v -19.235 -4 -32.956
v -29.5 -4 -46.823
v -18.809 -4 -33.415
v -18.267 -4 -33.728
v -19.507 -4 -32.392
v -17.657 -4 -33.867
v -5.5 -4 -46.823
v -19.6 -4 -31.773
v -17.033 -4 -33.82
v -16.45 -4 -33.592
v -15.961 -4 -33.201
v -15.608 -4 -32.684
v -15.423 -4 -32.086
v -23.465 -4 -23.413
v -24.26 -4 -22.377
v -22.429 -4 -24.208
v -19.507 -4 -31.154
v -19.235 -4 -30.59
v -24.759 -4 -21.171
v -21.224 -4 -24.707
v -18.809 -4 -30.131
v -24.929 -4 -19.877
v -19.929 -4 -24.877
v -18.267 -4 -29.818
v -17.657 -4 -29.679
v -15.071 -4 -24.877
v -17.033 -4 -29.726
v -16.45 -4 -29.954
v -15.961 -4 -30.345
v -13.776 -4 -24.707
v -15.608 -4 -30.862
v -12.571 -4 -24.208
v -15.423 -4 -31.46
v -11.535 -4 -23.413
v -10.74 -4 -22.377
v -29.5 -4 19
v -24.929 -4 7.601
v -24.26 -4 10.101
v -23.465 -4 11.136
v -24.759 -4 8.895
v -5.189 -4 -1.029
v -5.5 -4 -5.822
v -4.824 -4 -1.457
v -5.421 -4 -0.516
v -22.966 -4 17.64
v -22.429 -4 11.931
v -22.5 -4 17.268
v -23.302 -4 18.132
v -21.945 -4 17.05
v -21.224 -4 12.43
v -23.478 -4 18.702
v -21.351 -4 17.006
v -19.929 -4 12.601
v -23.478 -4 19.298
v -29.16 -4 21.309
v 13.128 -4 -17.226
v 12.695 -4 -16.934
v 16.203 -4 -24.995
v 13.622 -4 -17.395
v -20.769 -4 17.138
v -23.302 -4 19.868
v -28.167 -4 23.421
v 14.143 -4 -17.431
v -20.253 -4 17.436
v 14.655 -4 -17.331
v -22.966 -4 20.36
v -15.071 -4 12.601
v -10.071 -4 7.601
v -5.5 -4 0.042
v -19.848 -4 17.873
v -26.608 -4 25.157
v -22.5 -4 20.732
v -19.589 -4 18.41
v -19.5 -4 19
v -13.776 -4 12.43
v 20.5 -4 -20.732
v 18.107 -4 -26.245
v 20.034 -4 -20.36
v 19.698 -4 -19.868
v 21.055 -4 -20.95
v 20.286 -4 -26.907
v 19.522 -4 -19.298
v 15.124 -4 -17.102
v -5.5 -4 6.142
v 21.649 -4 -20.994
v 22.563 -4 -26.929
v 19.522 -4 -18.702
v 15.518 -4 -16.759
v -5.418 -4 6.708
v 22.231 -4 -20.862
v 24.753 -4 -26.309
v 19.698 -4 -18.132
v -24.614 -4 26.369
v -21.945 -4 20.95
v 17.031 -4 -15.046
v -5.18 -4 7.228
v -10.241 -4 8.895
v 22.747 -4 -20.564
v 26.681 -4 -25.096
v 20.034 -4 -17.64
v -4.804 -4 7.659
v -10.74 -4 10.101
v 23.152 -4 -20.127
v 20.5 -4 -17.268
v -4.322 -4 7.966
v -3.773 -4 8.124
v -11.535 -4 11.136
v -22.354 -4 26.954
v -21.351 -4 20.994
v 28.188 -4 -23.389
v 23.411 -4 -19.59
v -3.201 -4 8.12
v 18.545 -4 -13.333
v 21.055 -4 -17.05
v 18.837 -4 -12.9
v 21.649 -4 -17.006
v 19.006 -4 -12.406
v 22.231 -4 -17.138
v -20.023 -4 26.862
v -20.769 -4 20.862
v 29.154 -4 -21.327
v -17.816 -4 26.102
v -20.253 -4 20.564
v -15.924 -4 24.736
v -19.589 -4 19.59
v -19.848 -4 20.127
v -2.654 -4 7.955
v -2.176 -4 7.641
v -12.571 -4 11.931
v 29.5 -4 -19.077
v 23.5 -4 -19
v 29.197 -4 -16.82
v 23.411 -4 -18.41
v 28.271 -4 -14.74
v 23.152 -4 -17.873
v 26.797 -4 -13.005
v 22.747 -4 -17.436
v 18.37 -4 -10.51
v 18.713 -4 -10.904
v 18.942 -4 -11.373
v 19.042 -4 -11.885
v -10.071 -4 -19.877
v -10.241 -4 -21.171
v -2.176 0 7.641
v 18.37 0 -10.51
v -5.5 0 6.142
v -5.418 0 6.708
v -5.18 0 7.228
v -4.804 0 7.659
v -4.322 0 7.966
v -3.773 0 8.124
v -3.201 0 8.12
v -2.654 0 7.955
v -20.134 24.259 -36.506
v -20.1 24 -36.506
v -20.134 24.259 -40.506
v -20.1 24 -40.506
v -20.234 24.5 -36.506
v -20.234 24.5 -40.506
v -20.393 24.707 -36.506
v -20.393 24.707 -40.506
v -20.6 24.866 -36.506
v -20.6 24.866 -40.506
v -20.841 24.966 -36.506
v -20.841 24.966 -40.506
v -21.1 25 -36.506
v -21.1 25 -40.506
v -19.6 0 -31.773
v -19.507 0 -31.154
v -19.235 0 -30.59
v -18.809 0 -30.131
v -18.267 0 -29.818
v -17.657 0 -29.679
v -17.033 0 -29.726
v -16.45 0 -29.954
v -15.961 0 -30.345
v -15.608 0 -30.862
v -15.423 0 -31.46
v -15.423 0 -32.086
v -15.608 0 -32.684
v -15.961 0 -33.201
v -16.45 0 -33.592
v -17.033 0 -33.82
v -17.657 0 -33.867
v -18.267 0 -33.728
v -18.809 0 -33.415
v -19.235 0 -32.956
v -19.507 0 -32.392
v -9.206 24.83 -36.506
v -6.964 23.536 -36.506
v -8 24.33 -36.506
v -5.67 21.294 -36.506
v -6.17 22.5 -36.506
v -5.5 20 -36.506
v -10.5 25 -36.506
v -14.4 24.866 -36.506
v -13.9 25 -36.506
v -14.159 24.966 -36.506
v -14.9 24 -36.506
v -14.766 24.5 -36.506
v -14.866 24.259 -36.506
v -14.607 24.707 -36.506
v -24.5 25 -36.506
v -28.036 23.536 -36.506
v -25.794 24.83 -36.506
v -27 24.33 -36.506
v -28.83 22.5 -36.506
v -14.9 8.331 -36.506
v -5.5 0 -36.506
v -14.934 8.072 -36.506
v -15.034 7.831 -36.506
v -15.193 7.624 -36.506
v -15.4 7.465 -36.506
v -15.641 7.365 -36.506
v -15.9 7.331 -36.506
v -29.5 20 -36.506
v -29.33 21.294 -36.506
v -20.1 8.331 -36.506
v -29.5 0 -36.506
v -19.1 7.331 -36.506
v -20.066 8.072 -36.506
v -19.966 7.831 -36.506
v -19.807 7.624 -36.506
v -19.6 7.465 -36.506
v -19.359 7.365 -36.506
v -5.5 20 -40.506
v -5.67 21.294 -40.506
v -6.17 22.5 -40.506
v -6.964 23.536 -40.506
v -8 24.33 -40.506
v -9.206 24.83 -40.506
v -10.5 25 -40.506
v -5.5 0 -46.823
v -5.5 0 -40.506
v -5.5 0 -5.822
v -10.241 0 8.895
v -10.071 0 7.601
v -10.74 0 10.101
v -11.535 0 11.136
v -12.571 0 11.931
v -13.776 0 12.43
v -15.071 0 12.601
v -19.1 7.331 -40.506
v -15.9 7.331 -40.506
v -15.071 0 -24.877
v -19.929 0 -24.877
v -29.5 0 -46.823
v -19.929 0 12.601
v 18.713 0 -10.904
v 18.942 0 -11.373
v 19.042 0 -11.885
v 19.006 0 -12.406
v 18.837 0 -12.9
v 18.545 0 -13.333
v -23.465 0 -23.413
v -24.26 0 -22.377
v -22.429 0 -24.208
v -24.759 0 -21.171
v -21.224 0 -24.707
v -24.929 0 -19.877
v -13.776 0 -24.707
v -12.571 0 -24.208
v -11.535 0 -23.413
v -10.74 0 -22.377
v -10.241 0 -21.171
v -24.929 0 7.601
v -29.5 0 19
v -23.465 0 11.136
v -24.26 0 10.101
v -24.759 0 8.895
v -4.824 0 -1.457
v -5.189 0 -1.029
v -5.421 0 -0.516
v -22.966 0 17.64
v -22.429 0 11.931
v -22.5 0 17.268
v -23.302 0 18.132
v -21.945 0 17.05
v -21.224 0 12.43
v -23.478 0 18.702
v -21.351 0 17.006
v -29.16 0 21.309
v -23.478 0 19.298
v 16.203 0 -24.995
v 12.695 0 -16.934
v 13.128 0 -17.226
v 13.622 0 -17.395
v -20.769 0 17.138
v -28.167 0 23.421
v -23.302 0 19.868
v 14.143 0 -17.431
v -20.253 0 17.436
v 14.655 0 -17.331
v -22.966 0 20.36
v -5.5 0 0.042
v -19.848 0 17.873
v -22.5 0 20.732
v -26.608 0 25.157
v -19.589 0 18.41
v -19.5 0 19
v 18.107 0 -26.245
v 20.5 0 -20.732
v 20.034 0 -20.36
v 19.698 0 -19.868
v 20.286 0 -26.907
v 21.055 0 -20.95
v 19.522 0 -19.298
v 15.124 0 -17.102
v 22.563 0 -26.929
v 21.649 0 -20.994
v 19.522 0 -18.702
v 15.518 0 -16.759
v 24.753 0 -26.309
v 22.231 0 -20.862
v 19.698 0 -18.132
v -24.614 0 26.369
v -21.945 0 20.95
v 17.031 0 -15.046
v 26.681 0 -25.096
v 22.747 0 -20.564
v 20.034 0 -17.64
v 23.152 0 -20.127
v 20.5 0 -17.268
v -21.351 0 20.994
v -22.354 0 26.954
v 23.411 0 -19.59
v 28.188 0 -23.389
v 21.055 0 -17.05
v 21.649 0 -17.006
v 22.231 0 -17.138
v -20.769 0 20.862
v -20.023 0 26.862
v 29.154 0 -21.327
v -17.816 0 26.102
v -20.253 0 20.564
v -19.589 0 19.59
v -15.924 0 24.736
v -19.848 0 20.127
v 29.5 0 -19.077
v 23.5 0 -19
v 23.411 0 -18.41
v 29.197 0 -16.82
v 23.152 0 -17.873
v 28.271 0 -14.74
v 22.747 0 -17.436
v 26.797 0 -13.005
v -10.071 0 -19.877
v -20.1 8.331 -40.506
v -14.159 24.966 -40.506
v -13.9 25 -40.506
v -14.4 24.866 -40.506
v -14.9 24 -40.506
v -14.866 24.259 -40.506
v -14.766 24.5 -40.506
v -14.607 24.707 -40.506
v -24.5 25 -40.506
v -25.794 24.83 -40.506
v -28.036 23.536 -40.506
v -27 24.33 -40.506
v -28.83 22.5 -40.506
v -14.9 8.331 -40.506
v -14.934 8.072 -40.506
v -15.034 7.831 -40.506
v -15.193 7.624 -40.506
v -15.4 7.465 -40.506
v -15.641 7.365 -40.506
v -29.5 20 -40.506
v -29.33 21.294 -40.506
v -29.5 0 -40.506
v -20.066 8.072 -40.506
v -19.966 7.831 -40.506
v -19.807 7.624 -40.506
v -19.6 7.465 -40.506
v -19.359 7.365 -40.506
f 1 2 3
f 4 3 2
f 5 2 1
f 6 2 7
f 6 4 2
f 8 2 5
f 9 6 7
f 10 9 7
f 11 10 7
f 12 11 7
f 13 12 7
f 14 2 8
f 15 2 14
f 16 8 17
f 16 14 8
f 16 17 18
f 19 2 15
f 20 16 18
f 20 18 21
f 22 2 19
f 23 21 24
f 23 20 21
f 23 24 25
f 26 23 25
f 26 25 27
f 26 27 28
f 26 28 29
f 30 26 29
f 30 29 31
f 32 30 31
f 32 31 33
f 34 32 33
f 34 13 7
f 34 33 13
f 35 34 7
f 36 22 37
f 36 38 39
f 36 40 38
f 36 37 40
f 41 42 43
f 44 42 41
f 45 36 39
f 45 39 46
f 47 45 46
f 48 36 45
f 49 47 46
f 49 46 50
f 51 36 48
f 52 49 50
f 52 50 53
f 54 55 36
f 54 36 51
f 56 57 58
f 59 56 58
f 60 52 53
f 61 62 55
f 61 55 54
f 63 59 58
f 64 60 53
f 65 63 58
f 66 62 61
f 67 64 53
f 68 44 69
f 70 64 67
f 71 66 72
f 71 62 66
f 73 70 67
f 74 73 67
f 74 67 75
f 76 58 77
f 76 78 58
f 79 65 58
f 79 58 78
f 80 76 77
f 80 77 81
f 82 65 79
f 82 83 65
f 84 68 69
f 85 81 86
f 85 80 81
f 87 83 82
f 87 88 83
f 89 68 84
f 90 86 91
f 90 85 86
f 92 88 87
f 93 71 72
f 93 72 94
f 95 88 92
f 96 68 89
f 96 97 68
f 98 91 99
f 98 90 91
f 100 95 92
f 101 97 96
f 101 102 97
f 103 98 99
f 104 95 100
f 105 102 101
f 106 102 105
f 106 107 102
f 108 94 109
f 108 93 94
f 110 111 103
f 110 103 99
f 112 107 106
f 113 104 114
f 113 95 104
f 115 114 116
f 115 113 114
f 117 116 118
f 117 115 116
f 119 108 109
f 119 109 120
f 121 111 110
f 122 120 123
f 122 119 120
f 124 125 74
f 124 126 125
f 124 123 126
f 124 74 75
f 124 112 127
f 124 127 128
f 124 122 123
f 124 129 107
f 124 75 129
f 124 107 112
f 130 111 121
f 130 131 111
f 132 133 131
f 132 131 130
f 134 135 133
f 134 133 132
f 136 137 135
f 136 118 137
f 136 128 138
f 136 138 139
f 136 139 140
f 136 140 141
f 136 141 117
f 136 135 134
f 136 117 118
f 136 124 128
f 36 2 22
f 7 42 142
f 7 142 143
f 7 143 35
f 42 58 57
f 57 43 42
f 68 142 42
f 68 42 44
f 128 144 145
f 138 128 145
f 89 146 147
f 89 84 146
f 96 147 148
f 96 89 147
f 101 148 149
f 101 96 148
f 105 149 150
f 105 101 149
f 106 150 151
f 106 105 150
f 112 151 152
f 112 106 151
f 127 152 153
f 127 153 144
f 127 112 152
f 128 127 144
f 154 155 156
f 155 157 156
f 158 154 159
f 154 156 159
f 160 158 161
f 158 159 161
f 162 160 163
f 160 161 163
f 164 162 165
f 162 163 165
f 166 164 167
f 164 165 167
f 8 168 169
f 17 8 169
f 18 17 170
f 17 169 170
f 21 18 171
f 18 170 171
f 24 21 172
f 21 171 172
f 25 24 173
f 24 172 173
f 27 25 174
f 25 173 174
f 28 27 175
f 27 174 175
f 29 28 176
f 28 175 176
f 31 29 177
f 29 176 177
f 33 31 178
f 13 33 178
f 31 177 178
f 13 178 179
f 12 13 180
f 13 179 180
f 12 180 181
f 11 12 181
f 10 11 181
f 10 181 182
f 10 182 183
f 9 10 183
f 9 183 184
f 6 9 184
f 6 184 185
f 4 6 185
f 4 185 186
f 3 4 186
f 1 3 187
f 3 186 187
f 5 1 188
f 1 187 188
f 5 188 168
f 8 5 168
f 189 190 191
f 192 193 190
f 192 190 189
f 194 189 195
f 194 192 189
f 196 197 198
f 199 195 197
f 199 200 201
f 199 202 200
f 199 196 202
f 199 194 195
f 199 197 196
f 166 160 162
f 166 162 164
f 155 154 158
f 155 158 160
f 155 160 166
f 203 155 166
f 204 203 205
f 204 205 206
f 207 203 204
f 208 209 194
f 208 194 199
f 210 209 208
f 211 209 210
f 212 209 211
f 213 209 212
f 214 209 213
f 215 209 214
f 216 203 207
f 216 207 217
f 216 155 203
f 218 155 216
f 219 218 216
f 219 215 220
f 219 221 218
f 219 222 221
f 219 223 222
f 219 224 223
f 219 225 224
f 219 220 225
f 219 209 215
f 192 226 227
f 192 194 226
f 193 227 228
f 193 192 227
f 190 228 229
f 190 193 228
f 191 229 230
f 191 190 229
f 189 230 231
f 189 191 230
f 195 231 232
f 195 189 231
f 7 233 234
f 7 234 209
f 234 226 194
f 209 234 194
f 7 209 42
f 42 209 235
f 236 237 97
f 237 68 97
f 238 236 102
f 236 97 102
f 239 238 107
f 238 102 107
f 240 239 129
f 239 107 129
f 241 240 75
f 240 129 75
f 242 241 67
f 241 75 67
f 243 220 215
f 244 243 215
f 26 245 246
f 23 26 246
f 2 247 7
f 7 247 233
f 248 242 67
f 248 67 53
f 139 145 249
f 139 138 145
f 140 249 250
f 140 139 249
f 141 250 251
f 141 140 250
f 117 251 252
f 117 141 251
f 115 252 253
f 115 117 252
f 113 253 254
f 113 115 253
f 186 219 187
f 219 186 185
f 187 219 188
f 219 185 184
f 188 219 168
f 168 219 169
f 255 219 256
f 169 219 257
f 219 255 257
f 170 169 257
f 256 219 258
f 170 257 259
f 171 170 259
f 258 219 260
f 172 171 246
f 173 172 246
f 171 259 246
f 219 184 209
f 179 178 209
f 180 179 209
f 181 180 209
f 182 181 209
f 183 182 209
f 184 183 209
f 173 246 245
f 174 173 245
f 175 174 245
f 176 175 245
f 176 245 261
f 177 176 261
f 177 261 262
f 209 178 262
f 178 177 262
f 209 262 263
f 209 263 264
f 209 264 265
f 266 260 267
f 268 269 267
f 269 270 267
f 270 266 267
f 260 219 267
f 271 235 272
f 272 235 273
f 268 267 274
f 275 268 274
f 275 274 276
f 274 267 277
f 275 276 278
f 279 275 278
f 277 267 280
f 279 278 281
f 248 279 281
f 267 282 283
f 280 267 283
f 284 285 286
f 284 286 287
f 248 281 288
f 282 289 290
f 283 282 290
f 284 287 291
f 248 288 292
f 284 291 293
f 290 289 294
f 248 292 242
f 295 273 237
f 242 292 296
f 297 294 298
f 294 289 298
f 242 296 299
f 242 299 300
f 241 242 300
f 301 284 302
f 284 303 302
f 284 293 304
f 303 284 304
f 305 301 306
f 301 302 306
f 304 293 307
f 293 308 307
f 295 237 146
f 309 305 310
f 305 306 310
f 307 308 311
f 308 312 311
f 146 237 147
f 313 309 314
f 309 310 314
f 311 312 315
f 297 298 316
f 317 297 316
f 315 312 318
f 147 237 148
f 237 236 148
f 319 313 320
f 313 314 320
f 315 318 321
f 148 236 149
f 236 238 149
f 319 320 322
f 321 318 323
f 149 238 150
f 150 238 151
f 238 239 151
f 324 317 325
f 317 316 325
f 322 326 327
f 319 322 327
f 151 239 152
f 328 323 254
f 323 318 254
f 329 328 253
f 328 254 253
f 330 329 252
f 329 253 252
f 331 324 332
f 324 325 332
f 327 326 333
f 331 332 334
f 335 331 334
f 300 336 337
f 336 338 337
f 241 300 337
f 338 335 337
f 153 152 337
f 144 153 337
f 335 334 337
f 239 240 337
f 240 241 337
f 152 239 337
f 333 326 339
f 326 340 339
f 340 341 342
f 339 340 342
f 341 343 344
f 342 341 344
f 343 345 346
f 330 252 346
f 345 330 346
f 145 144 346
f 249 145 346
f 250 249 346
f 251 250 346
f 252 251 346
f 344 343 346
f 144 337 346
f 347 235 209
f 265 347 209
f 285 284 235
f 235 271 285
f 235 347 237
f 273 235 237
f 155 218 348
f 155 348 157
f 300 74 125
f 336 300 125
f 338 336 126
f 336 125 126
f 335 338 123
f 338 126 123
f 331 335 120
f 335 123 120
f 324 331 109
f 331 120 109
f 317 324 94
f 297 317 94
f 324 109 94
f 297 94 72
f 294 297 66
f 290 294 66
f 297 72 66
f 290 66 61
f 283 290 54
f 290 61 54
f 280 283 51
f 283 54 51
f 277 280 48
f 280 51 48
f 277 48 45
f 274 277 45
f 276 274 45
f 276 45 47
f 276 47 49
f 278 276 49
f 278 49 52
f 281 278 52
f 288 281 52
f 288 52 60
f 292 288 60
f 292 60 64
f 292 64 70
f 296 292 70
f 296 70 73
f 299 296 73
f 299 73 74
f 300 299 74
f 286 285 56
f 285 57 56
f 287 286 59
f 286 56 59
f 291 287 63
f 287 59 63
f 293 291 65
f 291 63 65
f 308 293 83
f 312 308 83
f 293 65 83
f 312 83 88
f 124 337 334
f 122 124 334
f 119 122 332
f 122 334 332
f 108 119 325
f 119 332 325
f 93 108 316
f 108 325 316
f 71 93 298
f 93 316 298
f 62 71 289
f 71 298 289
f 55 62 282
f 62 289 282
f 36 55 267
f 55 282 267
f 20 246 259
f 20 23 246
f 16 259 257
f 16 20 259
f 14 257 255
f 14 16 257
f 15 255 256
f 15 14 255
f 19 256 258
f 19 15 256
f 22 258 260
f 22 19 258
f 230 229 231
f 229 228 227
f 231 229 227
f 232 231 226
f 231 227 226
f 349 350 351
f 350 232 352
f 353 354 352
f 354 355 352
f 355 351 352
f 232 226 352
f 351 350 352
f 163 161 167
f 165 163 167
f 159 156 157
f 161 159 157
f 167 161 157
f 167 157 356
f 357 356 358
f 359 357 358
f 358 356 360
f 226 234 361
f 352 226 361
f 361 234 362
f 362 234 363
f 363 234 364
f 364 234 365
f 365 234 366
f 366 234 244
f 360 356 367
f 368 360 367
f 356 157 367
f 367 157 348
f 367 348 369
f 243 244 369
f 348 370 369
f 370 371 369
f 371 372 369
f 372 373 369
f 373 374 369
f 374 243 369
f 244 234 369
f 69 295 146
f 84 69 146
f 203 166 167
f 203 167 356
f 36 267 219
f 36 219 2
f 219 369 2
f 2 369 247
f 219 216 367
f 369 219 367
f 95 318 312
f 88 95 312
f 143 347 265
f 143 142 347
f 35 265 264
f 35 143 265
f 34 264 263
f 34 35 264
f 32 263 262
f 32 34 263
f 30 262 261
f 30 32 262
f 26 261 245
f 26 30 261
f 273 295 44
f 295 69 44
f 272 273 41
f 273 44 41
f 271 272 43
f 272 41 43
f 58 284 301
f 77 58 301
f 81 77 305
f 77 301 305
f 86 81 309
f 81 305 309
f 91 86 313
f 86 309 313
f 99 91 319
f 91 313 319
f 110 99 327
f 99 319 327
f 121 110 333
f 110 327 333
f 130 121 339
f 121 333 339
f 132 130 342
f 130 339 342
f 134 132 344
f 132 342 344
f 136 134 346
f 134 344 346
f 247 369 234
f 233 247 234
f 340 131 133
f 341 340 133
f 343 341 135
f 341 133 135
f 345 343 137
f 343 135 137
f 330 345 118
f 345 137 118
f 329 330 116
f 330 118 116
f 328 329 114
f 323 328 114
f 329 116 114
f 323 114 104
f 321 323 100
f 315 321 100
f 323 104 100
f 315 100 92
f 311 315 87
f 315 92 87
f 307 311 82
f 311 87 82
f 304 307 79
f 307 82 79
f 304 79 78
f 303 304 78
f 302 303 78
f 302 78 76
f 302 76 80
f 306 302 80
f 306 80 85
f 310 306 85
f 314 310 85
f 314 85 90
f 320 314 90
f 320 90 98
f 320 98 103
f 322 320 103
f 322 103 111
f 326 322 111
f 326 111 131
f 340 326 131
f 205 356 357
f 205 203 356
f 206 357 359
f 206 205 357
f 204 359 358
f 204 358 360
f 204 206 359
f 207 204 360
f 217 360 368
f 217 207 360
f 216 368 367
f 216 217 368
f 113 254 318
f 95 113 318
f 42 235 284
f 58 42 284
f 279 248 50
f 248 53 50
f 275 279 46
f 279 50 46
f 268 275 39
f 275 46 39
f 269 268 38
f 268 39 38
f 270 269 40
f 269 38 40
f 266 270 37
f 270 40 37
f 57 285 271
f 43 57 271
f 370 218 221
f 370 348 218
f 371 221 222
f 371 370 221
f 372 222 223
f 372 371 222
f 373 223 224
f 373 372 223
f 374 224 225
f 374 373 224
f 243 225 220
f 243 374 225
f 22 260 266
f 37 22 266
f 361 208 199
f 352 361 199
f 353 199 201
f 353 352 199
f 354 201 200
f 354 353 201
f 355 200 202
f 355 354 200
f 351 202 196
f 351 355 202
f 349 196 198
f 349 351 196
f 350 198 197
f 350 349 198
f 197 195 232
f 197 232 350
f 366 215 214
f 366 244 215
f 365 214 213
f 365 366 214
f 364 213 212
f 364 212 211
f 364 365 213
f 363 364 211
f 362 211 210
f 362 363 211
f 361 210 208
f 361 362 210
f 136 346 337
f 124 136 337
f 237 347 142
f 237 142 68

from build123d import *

# Parameters (mm, degrees)
F1_DEPTH  = 4
F2_R      = 2
F3_DEPTH  = 25
F4_W      = 24
F4_H      = 4
F5_DEPTH  = 25
F6_W      = 5.2
F6_H      = 17.668709
F7_DEPTH  = 25
F8_R      = 1
F9_R      = 1
F10_R     = 5
F11_W     = 14.858924
F11_H     = 37.477908
F12_DEPTH = 4
F13_DEPTH = 25
F14_R     = 2.1
F15_DEPTH = 4
F16_R     = 5
F17_R     = 2


with BuildPart() as f1:
    # F0 (on Front) → F1 (new body)
    with BuildSketch(Plane.XZ):
        with BuildLine():
            Line((26.796633, -13.004529), (-15.923725, 24.736302))
            ThreePointArc((-15.923725, 24.736302), (-24.613664, 26.369199), (-29.5, 19))
            Line((-29.5, 19), (-29.5, -46.82299))
            Line((-29.5, -46.82299), (-5.5, -46.82299))
            Line((-5.5, -46.82299), (-5.5, -5.821871))
            Line((-5.5, -5.821871), (16.203367, -24.995471))
            Line((16.203367, -24.995471), (26.796633, -13.004529))
        make_face()
        with BuildLine():
            ThreePointArc((16.203367, -24.995471), (27.495471, -24.296633), (26.796633, -13.004529))
            Line((26.796633, -13.004529), (16.203367, -24.995471))
        make_face()
    extrude(amount=F1_DEPTH)

    # F2 (on face) → F3 (cut)
    with BuildSketch(Plane.XZ.offset(4)):
        with Locations((-21.5, 19)):
            Circle(F2_R)
        with Locations((21.5, -19)):
            Circle(F2_R)
    extrude(amount=-F3_DEPTH, mode=Mode.SUBTRACT)

    # F4 (on face) → F5 (join)
    with BuildSketch(Plane(origin=(0, 0, 0), x_dir=(-1, 0, 0), z_dir=(0, 1, 0))):
        with Locations((17.5, -38.505935)):
            Rectangle(F4_W, F4_H)
    extrude(amount=F5_DEPTH)

    # F6 (on face) → F7 (cut)
    with BuildSketch(Plane.XY.offset(-36.505935)):
        with Locations((-17.5, 16.165646)):
            Rectangle(F6_W, F6_H)
    extrude(amount=-F7_DEPTH, mode=Mode.SUBTRACT)

    # F8
    f8_edges = [f1.edges().sort_by_distance(p)[0] for p in [
        (-20.1, 7.331291, -38.505935),
    ]]
    fillet(f8_edges, radius=F8_R)

    # F9
    f9_edges = [f1.edges().sort_by_distance(p)[0] for p in [
        (-14.9, 7.331291, -38.505935),
        (-14.9, 25, -38.505935),
        (-20.1, 25, -38.505935),
    ]]
    fillet(f9_edges, radius=F9_R)

    # F10
    f10_edges = [f1.edges().sort_by_distance(p)[0] for p in [
        (-5.5, 25, -38.505935),
        (-29.5, 25, -38.505935),
    ]]
    fillet(f10_edges, radius=F10_R)

    # F11 (on face) → F12 (cut, through all)
    with BuildSketch(Plane(origin=(0, 0, 0), x_dir=(-1, 0, 0), z_dir=(0, 1, 0))):
        with Locations((17.5, -6.138429)):
            Rectangle(F11_W, F11_H)
        Polygon((5.5, 10.577904), (-19.869124, -11.83417), (-17.031449, -15.046247), (5.5, 4.858914), align=None)
        Polygon((5.5, 4.858914), (-17.031449, -15.046247), (-14.193775, -18.258324), (5.5, -0.860075), align=None)
    extrude(amount=-F12_DEPTH, mode=Mode.SUBTRACT)

    # F11 (on face) → F13 (cut)
    with BuildSketch(Plane(origin=(0, 0, 0), x_dir=(-1, 0, 0), z_dir=(0, 1, 0))):
        with Locations((17.5, -6.138429)):
            Rectangle(F11_W, F11_H)
        Polygon((5.5, 10.577904), (-19.869124, -11.83417), (-17.031449, -15.046247), (5.5, 4.858914), align=None)
        Polygon((5.5, 4.858914), (-17.031449, -15.046247), (-14.193775, -18.258324), (5.5, -0.860075), align=None)
    extrude(amount=-F13_DEPTH, mode=Mode.SUBTRACT)

    # F14 (on face) → F15 (cut, through all)
    with BuildSketch(Plane(origin=(0, 0, 0), x_dir=(-1, 0, 0), z_dir=(0, 1, 0))):
        with Locations((17.5, -31.773042)):
            Circle(F14_R)
    extrude(amount=-F15_DEPTH, mode=Mode.SUBTRACT)

    # F16
    f16_edges = [f1.edges().sort_by_distance(p)[0] for p in [
        (-24.929462, -2, 12.600525),
        (-10.070538, -2, 12.600525),
        (-10.070538, -2, -24.877383),
        (-24.929462, -2, -24.877383),
    ]]
    fillet(f16_edges, radius=F16_R)

    # F17
    f17_edges = [f1.edges().sort_by_distance(p)[0] for p in [
        (14.193775, -2, -18.258324),
        (19.869124, -2, -11.83417),
        (-5.5, -2, -0.860075),
        (-5.5, -2, 10.577904),
    ]]
    fillet(f17_edges, radius=F17_R)


solid = f1.part
